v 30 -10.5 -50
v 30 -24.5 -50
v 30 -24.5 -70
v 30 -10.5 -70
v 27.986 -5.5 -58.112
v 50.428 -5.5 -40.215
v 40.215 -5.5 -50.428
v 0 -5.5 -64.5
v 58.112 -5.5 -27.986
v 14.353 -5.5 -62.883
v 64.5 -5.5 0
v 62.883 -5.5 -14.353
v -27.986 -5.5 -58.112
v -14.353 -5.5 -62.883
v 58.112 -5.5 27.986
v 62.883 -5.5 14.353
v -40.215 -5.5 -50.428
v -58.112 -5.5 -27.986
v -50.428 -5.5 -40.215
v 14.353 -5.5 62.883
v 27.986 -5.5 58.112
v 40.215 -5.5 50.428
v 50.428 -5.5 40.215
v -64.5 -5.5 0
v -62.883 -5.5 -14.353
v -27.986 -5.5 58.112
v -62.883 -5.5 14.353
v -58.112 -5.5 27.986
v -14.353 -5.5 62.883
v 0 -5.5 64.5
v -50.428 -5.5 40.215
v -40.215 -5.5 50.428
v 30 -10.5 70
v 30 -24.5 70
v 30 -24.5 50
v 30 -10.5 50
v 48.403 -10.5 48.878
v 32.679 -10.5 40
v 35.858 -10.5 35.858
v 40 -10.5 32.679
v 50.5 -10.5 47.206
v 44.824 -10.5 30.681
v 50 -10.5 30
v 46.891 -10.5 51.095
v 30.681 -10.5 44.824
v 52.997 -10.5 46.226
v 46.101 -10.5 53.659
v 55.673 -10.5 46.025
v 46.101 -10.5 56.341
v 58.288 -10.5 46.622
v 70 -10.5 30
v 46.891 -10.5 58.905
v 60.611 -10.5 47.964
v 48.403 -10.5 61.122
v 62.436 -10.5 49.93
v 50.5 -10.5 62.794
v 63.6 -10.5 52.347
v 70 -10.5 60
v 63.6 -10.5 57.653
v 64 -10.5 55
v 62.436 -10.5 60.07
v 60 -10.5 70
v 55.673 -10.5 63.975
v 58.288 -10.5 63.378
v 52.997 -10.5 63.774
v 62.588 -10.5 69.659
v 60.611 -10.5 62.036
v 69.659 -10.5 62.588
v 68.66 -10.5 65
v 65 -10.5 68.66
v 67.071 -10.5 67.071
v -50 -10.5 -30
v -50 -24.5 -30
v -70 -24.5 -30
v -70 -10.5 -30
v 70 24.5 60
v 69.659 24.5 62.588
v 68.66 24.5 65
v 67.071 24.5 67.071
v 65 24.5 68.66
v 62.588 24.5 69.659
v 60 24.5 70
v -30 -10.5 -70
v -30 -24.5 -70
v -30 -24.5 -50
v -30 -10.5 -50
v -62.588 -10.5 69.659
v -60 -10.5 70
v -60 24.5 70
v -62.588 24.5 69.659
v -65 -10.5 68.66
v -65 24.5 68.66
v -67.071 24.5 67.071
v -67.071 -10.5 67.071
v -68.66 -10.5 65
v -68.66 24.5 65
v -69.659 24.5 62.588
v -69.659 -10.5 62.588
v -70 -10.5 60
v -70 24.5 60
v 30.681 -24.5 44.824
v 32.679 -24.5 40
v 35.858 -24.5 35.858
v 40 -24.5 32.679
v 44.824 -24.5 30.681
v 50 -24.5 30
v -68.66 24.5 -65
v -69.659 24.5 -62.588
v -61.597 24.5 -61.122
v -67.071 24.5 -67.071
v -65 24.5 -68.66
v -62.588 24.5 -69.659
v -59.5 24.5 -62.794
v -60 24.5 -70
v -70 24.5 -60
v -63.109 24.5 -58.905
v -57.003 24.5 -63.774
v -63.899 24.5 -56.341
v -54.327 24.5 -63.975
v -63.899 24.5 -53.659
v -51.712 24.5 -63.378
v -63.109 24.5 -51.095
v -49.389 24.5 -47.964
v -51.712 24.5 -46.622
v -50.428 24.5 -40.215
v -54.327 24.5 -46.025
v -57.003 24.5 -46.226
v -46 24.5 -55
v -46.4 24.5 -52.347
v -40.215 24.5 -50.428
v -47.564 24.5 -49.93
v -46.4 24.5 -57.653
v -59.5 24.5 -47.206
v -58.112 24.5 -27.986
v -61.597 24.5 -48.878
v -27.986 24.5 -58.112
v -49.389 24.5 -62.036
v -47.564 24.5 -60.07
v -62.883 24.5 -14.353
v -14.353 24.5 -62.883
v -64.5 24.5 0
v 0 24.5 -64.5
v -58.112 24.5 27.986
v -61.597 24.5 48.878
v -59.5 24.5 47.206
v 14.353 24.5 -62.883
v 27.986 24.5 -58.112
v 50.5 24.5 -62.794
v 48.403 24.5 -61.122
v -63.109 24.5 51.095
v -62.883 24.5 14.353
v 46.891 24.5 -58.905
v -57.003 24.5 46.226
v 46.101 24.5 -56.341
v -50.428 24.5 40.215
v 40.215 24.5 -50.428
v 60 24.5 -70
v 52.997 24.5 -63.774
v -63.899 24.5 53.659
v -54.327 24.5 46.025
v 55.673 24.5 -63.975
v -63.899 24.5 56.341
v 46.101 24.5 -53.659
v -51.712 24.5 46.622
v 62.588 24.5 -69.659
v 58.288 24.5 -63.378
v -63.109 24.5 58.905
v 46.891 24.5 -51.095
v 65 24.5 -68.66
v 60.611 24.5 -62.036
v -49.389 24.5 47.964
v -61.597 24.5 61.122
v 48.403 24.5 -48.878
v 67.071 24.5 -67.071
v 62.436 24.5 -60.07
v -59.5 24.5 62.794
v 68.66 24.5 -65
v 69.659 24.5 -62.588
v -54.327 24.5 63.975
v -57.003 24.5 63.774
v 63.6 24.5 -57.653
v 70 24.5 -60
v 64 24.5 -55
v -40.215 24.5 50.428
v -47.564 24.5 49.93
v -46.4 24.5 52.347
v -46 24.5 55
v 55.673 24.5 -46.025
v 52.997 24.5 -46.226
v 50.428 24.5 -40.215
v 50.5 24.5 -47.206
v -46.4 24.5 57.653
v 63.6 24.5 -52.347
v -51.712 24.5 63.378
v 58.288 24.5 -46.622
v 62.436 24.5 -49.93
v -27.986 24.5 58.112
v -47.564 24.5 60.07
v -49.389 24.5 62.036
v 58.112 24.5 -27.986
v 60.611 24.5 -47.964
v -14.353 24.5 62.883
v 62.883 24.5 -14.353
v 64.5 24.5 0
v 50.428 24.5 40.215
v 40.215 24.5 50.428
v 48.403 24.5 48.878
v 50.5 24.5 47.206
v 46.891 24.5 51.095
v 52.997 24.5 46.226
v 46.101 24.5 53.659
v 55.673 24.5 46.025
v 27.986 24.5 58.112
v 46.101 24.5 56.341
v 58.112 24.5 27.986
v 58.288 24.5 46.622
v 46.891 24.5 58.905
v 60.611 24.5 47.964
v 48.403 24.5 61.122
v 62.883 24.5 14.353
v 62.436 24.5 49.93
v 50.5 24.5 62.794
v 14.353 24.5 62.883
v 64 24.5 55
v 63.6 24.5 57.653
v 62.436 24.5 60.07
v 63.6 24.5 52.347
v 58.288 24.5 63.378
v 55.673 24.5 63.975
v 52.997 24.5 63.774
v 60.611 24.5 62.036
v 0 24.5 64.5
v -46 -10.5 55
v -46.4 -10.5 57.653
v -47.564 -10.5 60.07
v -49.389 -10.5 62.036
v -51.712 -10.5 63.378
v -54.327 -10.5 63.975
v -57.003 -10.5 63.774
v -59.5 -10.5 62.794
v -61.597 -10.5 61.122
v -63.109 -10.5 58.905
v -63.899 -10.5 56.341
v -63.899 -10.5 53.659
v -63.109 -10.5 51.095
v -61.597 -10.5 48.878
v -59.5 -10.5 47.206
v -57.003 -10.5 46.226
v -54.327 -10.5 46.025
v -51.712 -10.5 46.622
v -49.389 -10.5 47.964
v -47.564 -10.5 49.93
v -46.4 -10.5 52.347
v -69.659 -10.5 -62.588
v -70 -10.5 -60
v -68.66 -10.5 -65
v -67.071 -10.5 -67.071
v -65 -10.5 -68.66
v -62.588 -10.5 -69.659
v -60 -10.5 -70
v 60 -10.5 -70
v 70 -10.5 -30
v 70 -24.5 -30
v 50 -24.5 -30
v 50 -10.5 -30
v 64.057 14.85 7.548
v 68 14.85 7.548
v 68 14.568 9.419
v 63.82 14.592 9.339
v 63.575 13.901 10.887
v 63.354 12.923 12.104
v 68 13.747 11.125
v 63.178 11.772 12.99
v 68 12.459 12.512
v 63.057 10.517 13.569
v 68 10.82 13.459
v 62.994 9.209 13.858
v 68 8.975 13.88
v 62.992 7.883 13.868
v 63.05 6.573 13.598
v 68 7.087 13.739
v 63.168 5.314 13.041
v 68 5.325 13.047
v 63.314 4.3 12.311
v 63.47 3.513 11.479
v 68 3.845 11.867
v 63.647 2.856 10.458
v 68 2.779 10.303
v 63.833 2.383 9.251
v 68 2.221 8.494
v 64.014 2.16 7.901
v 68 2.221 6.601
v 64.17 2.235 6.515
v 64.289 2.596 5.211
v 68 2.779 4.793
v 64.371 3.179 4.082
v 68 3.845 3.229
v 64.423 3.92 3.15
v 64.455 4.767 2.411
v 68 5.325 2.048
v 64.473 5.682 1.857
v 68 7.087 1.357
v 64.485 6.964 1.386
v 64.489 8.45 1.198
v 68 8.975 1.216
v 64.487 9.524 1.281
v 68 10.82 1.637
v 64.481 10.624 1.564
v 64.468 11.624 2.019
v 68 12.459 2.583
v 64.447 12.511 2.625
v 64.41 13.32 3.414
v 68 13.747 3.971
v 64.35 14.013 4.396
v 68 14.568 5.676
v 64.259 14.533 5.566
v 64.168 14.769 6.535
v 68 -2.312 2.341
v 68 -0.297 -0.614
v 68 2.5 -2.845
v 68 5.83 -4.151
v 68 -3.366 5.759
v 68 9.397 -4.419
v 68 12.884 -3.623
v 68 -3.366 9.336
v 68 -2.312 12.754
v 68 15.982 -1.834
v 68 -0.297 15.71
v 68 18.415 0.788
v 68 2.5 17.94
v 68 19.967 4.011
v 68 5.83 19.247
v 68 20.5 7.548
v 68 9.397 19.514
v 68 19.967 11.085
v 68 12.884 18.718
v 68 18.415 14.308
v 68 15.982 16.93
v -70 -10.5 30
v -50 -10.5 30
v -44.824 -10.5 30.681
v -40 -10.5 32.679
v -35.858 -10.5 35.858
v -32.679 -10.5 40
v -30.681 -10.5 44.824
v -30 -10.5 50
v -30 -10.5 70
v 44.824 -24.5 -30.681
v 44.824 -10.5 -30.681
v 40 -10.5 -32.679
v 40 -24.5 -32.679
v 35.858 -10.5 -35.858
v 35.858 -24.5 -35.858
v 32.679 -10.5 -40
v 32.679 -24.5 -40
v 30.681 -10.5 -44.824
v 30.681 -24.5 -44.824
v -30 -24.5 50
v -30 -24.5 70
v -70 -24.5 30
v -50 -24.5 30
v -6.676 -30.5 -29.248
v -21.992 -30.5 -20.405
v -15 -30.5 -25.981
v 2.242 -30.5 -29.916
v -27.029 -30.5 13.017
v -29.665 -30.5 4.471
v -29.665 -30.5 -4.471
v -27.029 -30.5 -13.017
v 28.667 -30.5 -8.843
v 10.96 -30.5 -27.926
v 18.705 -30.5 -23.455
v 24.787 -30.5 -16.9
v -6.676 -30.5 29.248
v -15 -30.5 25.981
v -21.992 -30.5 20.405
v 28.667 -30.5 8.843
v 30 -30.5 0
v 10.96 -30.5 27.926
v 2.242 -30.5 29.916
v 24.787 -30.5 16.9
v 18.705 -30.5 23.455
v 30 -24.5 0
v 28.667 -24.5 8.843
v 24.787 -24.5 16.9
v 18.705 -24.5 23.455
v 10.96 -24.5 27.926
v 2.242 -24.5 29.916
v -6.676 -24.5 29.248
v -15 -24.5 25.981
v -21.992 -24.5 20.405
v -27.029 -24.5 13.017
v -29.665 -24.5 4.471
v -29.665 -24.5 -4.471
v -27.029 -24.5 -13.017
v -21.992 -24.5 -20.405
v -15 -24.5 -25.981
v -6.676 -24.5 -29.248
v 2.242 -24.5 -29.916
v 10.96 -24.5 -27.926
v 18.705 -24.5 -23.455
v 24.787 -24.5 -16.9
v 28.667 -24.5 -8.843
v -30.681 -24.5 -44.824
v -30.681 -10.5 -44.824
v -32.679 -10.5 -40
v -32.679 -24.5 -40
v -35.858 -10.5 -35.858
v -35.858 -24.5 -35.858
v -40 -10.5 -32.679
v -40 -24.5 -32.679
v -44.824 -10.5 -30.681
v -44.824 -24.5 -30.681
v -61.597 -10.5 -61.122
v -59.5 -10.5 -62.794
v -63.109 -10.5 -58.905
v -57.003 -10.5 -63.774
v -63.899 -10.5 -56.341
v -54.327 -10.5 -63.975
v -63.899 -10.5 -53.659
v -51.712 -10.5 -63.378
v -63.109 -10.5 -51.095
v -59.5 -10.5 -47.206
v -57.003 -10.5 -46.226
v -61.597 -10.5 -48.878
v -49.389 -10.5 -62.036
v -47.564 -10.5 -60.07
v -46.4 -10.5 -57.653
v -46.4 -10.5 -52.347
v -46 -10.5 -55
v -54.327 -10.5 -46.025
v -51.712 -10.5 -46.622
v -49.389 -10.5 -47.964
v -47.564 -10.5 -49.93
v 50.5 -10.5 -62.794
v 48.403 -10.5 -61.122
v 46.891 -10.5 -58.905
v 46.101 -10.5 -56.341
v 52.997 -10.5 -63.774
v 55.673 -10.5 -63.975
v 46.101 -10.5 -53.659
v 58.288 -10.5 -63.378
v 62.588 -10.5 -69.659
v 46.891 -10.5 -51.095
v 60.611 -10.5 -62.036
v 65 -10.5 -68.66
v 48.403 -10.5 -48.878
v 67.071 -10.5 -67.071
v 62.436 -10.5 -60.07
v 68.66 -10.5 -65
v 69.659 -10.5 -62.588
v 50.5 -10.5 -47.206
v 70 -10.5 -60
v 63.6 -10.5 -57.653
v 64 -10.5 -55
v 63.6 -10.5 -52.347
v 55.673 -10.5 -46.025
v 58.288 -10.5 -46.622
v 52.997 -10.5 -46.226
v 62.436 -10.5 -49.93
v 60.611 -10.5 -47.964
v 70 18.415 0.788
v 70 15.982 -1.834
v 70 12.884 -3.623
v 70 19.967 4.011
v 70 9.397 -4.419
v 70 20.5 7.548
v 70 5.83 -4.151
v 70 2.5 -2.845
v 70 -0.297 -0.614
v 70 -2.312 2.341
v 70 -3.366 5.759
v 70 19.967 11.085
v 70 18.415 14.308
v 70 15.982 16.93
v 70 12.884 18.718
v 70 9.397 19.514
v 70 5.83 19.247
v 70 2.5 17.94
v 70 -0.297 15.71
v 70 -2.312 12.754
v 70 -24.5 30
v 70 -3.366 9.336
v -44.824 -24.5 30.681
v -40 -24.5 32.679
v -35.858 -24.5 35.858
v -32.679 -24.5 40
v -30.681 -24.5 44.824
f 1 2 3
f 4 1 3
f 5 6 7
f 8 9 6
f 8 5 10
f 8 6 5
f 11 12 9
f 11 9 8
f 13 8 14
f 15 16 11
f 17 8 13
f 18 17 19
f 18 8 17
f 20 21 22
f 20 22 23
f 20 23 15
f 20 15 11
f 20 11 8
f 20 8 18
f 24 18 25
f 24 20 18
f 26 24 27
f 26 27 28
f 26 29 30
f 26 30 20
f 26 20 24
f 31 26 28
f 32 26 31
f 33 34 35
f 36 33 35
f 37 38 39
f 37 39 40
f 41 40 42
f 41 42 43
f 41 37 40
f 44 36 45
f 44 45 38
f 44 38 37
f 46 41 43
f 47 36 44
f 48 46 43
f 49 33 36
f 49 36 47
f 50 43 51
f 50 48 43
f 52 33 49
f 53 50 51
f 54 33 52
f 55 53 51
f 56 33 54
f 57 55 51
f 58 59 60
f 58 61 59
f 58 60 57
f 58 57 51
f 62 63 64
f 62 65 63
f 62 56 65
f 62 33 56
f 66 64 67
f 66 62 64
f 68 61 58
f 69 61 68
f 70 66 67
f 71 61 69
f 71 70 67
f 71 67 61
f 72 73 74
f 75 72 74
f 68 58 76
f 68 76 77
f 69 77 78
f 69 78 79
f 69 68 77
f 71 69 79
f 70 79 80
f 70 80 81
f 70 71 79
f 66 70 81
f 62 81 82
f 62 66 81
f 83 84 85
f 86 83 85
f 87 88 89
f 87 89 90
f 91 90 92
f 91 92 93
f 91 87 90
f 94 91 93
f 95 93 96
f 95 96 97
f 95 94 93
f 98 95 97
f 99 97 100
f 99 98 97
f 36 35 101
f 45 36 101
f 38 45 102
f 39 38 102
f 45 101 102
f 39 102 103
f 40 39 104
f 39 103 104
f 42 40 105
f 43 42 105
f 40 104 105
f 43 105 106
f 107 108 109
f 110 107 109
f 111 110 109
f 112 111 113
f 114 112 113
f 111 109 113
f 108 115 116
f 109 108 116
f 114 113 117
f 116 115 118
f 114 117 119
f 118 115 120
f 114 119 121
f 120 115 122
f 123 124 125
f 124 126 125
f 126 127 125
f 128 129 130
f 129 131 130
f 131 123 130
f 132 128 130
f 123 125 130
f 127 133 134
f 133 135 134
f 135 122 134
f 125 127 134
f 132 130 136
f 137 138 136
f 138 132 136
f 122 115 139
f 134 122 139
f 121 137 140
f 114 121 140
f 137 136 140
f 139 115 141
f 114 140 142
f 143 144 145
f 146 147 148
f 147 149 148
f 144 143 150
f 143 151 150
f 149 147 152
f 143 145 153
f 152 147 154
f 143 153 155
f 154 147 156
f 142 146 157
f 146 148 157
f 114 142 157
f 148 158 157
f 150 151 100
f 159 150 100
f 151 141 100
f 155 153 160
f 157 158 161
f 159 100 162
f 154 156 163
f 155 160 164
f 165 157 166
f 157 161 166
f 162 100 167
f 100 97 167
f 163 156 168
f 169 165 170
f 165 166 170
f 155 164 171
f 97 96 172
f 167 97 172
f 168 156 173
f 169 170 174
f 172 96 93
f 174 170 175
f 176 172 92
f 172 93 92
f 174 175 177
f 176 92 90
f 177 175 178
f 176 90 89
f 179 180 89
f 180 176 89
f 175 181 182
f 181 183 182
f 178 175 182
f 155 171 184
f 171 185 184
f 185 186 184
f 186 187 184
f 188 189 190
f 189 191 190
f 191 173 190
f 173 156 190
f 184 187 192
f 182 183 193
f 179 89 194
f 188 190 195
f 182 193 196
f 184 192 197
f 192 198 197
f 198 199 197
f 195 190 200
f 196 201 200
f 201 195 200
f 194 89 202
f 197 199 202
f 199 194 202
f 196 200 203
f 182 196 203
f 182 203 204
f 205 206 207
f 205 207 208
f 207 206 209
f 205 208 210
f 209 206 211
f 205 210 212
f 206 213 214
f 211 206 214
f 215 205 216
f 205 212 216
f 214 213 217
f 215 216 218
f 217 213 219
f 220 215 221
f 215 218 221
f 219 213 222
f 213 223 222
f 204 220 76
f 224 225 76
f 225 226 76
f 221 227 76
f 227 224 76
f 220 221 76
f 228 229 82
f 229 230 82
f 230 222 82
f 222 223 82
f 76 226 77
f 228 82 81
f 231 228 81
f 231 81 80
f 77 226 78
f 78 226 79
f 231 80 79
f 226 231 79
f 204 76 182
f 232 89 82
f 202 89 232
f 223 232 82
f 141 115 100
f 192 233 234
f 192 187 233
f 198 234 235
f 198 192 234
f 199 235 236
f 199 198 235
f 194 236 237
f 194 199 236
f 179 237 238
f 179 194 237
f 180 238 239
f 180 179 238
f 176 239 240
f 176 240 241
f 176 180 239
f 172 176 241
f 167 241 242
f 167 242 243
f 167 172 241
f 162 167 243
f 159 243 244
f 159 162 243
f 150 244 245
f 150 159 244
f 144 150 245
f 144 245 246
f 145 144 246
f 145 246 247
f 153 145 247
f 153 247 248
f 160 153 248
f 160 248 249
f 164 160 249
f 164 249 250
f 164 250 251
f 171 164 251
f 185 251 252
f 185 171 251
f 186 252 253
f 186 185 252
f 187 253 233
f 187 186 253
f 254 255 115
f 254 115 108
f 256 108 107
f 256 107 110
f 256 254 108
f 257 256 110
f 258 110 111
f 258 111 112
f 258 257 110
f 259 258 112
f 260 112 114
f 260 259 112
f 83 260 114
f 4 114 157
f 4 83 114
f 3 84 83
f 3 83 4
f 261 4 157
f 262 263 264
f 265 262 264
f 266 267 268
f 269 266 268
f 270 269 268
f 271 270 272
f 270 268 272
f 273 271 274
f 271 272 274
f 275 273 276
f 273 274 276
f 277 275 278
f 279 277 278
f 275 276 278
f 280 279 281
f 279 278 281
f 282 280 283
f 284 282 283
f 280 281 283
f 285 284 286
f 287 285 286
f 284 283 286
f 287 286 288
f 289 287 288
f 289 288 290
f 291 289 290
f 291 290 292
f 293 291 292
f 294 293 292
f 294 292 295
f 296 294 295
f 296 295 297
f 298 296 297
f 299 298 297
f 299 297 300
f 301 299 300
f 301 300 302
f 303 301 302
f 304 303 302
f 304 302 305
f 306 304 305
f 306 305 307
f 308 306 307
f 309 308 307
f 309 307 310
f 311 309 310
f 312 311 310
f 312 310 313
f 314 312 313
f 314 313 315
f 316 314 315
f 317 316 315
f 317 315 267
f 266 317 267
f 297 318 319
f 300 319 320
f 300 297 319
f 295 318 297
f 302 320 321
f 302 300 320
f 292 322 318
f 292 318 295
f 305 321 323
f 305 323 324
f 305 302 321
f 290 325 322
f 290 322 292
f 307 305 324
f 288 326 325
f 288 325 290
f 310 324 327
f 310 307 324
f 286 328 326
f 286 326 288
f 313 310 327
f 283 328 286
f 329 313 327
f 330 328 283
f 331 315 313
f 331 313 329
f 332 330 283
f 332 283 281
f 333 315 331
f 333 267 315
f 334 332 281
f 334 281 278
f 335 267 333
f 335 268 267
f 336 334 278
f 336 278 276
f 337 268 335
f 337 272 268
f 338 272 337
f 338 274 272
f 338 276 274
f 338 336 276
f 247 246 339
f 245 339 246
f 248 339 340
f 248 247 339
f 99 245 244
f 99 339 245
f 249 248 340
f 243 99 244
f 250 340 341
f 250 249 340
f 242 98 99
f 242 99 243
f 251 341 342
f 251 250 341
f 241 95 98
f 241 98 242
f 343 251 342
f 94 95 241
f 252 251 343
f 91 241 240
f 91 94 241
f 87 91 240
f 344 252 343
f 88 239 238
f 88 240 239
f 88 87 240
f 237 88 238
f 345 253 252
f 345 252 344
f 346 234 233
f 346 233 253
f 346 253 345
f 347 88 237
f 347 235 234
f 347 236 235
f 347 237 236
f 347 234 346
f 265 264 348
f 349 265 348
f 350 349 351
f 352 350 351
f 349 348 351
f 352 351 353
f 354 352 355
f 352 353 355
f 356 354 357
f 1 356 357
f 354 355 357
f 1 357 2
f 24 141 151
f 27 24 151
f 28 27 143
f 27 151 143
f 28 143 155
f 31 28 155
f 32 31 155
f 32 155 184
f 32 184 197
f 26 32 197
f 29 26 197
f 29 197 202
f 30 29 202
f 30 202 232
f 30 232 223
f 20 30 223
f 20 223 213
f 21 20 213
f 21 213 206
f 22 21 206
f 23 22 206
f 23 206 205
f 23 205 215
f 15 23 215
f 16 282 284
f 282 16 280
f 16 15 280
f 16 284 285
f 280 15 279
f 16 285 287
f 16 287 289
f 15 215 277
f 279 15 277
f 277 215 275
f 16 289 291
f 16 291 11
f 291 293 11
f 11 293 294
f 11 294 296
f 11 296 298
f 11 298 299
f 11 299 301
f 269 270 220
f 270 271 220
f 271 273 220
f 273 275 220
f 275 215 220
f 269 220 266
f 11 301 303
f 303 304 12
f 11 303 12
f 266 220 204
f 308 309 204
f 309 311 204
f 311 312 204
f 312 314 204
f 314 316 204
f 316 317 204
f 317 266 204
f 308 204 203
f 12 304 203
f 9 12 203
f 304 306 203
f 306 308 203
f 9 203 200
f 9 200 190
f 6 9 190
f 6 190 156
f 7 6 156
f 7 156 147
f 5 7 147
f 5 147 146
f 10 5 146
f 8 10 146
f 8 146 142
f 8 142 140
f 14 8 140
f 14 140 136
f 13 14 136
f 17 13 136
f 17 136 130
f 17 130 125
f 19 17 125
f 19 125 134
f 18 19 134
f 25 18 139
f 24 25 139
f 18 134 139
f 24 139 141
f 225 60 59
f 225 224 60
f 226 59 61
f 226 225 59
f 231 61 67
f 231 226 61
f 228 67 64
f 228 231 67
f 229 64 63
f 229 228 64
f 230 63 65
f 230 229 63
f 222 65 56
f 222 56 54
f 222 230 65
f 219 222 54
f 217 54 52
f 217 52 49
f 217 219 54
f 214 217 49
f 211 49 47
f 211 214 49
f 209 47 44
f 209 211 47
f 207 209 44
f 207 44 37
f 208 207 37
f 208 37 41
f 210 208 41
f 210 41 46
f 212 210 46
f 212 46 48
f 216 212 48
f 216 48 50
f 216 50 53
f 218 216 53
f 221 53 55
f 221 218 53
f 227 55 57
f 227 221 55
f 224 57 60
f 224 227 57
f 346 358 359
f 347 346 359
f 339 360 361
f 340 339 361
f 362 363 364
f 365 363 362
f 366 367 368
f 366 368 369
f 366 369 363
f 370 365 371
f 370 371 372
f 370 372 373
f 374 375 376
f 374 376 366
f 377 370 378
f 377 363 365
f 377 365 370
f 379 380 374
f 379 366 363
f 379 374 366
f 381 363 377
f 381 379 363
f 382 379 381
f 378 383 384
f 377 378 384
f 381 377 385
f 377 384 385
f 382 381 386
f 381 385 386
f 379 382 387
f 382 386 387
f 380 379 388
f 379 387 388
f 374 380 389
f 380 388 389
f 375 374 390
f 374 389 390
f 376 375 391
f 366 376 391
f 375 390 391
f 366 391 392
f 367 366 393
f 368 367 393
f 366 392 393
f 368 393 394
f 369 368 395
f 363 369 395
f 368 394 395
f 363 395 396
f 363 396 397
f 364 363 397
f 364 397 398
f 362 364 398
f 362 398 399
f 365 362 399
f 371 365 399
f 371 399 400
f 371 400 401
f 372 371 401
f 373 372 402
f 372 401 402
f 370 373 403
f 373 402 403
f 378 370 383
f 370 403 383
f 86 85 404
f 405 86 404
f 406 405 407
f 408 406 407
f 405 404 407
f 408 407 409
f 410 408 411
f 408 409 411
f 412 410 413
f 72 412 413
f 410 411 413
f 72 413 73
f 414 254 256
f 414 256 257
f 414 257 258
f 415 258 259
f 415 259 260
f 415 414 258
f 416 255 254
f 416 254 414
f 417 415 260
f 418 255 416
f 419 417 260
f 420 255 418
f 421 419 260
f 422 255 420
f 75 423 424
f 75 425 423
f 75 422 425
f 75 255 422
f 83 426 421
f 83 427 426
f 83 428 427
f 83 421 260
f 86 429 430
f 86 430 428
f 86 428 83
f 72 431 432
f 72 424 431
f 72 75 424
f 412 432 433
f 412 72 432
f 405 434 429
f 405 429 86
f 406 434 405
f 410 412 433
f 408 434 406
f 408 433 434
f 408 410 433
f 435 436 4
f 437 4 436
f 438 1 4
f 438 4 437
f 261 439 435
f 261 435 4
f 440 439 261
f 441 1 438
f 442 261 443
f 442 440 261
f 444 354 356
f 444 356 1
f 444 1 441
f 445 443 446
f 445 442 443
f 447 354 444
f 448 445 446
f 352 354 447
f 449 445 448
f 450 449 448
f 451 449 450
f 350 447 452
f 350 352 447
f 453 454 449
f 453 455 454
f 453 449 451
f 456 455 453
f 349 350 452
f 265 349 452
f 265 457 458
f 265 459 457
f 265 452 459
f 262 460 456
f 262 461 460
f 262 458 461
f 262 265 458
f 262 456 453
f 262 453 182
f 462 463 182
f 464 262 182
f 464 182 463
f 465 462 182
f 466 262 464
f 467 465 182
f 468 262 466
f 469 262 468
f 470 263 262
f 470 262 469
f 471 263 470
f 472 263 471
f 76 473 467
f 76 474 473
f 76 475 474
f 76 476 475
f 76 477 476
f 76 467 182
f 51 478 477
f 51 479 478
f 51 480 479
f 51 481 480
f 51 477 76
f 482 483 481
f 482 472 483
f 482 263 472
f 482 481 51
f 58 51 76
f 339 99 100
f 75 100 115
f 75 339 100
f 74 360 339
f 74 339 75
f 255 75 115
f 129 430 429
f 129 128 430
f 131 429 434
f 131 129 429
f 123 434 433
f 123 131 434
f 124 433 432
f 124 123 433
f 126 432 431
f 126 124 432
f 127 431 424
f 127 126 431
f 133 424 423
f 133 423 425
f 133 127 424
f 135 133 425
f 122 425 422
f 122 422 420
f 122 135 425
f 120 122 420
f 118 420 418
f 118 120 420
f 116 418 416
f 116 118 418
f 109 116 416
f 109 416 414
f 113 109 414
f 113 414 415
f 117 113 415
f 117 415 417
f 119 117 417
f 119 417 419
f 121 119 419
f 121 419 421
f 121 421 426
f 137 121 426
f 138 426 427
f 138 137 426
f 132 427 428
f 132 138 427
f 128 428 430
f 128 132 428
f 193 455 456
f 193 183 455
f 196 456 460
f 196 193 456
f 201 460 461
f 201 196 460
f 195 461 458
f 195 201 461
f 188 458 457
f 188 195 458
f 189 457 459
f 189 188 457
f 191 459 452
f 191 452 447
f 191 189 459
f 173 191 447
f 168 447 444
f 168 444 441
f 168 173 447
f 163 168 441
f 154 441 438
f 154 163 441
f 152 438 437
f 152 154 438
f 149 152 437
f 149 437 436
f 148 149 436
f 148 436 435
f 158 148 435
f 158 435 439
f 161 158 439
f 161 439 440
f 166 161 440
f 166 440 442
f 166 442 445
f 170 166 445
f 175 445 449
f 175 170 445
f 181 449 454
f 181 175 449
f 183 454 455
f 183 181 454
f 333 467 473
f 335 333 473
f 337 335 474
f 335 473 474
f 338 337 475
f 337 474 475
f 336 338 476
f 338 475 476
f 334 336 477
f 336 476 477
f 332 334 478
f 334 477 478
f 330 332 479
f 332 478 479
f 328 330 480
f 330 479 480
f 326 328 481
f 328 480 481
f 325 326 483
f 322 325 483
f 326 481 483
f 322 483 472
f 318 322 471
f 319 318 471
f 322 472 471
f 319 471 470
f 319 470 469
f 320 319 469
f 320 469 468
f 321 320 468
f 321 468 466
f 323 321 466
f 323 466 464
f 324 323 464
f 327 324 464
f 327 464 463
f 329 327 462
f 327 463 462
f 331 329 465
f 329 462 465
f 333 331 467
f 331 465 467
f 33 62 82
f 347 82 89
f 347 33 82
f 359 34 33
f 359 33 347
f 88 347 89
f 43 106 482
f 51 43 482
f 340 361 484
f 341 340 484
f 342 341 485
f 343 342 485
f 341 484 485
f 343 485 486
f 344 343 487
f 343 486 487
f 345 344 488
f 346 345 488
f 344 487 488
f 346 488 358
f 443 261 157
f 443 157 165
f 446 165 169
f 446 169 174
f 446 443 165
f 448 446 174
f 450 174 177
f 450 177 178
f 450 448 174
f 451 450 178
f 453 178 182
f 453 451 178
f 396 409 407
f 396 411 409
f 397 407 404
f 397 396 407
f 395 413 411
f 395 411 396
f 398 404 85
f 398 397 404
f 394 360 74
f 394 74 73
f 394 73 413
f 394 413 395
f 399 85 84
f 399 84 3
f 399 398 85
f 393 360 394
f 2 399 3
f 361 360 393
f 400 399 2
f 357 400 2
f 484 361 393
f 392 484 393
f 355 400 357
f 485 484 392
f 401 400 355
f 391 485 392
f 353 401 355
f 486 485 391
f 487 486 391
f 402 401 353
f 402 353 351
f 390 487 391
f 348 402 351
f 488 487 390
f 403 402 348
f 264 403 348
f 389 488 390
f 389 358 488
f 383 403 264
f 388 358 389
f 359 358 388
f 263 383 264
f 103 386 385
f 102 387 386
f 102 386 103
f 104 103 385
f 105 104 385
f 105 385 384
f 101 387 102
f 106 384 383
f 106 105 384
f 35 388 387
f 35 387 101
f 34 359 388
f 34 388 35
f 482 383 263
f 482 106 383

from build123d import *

# Parameters (mm, degrees)
F0_R      = 9
F1_DEPTH  = 24.5
F2_R      = 9
F3_DEPTH  = 14
F4_R      = 30
F5_DEPTH  = 6
F6_R      = 64.5
F8_DEPTH  = 30
F7_R      = 12
F7_R_2    = 6.35
F9_DEPTH  = 2
F10_DEPTH = 8


with BuildPart() as f1:
    # F0 (on Front) → F1 (new body, symmetric)
    with BuildSketch(Plane.XZ):
        with BuildLine():
            Line((-60, -70), (60, -70))
            ThreePointArc((60, -70), (67.0710678119, -67.0710678119), (70, -60))
            Line((70, -60), (70, 60))
            ThreePointArc((70, 60), (67.0710678119, 67.0710678119), (60, 70))
            Line((60, 70), (-60, 70))
            ThreePointArc((-60, 70), (-67.0710678119, 67.0710678119), (-70, 60))
            Line((-70, 60), (-70, -60))
            ThreePointArc((-70, -60), (-67.0710678119, -67.0710678119), (-60, -70))
        make_face()
        with Locations((-55, -55)):
            Circle(F0_R, mode=Mode.SUBTRACT)
        with Locations((55, -55)):
            Circle(F0_R, mode=Mode.SUBTRACT)
        with Locations((-55, 55)):
            Circle(F0_R, mode=Mode.SUBTRACT)
        with Locations((55, 55)):
            Circle(F0_R, mode=Mode.SUBTRACT)
    extrude(amount=F1_DEPTH, both=True)

    # F2 (on face) → F3 (cut)
    with BuildSketch(Plane.XZ.offset(24.5)):
        with BuildLine():
            Line((30, -50), (30, -70))
            Line((30, -70), (60, -70))
            ThreePointArc((60, -70), (67.0710678119, -67.0710678119), (70, -60))
            Line((70, -60), (70, -30))
            Line((70, -30), (50, -30))
            ThreePointArc((50, -30), (35.8578643763, -35.8578643763), (30, -50))
        make_face()
        with Locations((55, -55)):
            Circle(F2_R, mode=Mode.SUBTRACT)
        with BuildLine():
            Line((60, 70), (30, 70))
            Line((30, 70), (30, 50))
            ThreePointArc((30, 50), (35.8578643763, 35.8578643763), (50, 30))
            Line((50, 30), (70, 30))
            Line((70, 30), (70, 60))
            ThreePointArc((70, 60), (67.0710678119, 67.0710678119), (60, 70))
        make_face()
        with Locations((55, 55)):
            Circle(F2_R, mode=Mode.SUBTRACT)
        with BuildLine():
            Line((-70, 60), (-70, 30))
            Line((-70, 30), (-50, 30))
            ThreePointArc((-50, 30), (-35.8578643763, 35.8578643763), (-30, 50))
            Line((-30, 50), (-30, 70))
            Line((-30, 70), (-60, 70))
            ThreePointArc((-60, 70), (-67.0710678119, 67.0710678119), (-70, 60))
        make_face()
        with Locations((-55, 55)):
            Circle(F2_R, mode=Mode.SUBTRACT)
        with BuildLine():
            Line((-50, -30), (-70, -30))
            Line((-70, -30), (-70, -60))
            ThreePointArc((-70, -60), (-67.0710678119, -67.0710678119), (-60, -70))
            Line((-60, -70), (-30, -70))
            Line((-30, -70), (-30, -50))
            ThreePointArc((-30, -50), (-35.8578643763, -35.8578643763), (-50, -30))
        make_face()
        with Locations((-55, -55)):
            Circle(F2_R, mode=Mode.SUBTRACT)
    extrude(amount=-F3_DEPTH, mode=Mode.SUBTRACT)

    # F4 (on face) → F5 (join)
    with BuildSketch(Plane.XZ.offset(24.5)):
        Circle(F4_R)
    extrude(amount=F5_DEPTH)

    # F6 (on face) → F8 (cut)
    with BuildSketch(Plane(origin=(0, 24.5, 0), x_dir=(-1, 0, 0), z_dir=(0, 1, 0))):
        Circle(F6_R)
    extrude(amount=-F8_DEPTH, mode=Mode.SUBTRACT)

    # F7 (on face) → F9 (cut)
    with BuildSketch(Plane.YZ.offset(70)):
        with Locations((8.5, 7.547759451)):
            Circle(F7_R)
        with Locations((8.5, 7.547759451)):
            Circle(F7_R_2, mode=Mode.SUBTRACT)
    extrude(amount=-F9_DEPTH, mode=Mode.SUBTRACT)

    # F10 (cut): a face of the model
    f10_faces = [f1.faces().sort_by_distance(p)[0] for p in [
        (70, 8.5, 7.547759451),
    ]]
    extrude(f10_faces, amount=-F10_DEPTH, mode=Mode.SUBTRACT)


solid = f1.part
